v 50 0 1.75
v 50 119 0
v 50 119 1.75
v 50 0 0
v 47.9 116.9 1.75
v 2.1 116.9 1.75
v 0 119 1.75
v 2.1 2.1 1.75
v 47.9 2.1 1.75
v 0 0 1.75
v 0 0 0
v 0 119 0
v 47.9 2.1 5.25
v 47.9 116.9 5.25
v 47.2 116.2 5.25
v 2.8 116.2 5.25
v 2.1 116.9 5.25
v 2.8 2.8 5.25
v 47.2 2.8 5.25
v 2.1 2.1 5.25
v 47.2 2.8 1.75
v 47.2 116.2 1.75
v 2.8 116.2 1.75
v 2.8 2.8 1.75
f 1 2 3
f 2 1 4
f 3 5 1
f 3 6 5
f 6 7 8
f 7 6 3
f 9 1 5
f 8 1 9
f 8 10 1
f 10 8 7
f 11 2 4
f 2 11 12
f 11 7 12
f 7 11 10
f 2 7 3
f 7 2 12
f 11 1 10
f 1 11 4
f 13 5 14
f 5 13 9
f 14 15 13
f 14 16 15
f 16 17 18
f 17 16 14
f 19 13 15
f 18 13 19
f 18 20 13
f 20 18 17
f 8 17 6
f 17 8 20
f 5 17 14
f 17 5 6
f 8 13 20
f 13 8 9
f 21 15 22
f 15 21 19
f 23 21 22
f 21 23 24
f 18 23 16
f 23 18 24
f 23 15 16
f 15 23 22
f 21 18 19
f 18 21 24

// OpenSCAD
//everything is in units of millimeters
resolution = 0.35;

//variables to keep in-sync with the other scad file
mainDepth = 50;
mainWidth = 119;
mainHeight = 40;
mainShellThickness = 5 * resolution;

margin = mainShellThickness + resolution;
lidThickness = resolution * 5; //z-axis
lidWidth = resolution * 2; //x & y axis thickness of the wall
innerLipHeight = resolution * 10;

difference() {
  union() {
    //top cover of the lid
    cube([mainDepth, mainWidth, lidThickness]);
    
    //the inner lip
    translate([margin, margin, lidThickness]) {
      cube([mainDepth - margin*2, mainWidth - margin*2, innerLipHeight]);
    };
  };
  
  //cutting out the inside to save on plastic used
  translate([margin + lidWidth, margin + lidWidth, lidThickness]) {
    cube([mainDepth - margin*2 - lidWidth*2, mainWidth - margin*2 - lidWidth*2, innerLipHeight]);
  }
};
